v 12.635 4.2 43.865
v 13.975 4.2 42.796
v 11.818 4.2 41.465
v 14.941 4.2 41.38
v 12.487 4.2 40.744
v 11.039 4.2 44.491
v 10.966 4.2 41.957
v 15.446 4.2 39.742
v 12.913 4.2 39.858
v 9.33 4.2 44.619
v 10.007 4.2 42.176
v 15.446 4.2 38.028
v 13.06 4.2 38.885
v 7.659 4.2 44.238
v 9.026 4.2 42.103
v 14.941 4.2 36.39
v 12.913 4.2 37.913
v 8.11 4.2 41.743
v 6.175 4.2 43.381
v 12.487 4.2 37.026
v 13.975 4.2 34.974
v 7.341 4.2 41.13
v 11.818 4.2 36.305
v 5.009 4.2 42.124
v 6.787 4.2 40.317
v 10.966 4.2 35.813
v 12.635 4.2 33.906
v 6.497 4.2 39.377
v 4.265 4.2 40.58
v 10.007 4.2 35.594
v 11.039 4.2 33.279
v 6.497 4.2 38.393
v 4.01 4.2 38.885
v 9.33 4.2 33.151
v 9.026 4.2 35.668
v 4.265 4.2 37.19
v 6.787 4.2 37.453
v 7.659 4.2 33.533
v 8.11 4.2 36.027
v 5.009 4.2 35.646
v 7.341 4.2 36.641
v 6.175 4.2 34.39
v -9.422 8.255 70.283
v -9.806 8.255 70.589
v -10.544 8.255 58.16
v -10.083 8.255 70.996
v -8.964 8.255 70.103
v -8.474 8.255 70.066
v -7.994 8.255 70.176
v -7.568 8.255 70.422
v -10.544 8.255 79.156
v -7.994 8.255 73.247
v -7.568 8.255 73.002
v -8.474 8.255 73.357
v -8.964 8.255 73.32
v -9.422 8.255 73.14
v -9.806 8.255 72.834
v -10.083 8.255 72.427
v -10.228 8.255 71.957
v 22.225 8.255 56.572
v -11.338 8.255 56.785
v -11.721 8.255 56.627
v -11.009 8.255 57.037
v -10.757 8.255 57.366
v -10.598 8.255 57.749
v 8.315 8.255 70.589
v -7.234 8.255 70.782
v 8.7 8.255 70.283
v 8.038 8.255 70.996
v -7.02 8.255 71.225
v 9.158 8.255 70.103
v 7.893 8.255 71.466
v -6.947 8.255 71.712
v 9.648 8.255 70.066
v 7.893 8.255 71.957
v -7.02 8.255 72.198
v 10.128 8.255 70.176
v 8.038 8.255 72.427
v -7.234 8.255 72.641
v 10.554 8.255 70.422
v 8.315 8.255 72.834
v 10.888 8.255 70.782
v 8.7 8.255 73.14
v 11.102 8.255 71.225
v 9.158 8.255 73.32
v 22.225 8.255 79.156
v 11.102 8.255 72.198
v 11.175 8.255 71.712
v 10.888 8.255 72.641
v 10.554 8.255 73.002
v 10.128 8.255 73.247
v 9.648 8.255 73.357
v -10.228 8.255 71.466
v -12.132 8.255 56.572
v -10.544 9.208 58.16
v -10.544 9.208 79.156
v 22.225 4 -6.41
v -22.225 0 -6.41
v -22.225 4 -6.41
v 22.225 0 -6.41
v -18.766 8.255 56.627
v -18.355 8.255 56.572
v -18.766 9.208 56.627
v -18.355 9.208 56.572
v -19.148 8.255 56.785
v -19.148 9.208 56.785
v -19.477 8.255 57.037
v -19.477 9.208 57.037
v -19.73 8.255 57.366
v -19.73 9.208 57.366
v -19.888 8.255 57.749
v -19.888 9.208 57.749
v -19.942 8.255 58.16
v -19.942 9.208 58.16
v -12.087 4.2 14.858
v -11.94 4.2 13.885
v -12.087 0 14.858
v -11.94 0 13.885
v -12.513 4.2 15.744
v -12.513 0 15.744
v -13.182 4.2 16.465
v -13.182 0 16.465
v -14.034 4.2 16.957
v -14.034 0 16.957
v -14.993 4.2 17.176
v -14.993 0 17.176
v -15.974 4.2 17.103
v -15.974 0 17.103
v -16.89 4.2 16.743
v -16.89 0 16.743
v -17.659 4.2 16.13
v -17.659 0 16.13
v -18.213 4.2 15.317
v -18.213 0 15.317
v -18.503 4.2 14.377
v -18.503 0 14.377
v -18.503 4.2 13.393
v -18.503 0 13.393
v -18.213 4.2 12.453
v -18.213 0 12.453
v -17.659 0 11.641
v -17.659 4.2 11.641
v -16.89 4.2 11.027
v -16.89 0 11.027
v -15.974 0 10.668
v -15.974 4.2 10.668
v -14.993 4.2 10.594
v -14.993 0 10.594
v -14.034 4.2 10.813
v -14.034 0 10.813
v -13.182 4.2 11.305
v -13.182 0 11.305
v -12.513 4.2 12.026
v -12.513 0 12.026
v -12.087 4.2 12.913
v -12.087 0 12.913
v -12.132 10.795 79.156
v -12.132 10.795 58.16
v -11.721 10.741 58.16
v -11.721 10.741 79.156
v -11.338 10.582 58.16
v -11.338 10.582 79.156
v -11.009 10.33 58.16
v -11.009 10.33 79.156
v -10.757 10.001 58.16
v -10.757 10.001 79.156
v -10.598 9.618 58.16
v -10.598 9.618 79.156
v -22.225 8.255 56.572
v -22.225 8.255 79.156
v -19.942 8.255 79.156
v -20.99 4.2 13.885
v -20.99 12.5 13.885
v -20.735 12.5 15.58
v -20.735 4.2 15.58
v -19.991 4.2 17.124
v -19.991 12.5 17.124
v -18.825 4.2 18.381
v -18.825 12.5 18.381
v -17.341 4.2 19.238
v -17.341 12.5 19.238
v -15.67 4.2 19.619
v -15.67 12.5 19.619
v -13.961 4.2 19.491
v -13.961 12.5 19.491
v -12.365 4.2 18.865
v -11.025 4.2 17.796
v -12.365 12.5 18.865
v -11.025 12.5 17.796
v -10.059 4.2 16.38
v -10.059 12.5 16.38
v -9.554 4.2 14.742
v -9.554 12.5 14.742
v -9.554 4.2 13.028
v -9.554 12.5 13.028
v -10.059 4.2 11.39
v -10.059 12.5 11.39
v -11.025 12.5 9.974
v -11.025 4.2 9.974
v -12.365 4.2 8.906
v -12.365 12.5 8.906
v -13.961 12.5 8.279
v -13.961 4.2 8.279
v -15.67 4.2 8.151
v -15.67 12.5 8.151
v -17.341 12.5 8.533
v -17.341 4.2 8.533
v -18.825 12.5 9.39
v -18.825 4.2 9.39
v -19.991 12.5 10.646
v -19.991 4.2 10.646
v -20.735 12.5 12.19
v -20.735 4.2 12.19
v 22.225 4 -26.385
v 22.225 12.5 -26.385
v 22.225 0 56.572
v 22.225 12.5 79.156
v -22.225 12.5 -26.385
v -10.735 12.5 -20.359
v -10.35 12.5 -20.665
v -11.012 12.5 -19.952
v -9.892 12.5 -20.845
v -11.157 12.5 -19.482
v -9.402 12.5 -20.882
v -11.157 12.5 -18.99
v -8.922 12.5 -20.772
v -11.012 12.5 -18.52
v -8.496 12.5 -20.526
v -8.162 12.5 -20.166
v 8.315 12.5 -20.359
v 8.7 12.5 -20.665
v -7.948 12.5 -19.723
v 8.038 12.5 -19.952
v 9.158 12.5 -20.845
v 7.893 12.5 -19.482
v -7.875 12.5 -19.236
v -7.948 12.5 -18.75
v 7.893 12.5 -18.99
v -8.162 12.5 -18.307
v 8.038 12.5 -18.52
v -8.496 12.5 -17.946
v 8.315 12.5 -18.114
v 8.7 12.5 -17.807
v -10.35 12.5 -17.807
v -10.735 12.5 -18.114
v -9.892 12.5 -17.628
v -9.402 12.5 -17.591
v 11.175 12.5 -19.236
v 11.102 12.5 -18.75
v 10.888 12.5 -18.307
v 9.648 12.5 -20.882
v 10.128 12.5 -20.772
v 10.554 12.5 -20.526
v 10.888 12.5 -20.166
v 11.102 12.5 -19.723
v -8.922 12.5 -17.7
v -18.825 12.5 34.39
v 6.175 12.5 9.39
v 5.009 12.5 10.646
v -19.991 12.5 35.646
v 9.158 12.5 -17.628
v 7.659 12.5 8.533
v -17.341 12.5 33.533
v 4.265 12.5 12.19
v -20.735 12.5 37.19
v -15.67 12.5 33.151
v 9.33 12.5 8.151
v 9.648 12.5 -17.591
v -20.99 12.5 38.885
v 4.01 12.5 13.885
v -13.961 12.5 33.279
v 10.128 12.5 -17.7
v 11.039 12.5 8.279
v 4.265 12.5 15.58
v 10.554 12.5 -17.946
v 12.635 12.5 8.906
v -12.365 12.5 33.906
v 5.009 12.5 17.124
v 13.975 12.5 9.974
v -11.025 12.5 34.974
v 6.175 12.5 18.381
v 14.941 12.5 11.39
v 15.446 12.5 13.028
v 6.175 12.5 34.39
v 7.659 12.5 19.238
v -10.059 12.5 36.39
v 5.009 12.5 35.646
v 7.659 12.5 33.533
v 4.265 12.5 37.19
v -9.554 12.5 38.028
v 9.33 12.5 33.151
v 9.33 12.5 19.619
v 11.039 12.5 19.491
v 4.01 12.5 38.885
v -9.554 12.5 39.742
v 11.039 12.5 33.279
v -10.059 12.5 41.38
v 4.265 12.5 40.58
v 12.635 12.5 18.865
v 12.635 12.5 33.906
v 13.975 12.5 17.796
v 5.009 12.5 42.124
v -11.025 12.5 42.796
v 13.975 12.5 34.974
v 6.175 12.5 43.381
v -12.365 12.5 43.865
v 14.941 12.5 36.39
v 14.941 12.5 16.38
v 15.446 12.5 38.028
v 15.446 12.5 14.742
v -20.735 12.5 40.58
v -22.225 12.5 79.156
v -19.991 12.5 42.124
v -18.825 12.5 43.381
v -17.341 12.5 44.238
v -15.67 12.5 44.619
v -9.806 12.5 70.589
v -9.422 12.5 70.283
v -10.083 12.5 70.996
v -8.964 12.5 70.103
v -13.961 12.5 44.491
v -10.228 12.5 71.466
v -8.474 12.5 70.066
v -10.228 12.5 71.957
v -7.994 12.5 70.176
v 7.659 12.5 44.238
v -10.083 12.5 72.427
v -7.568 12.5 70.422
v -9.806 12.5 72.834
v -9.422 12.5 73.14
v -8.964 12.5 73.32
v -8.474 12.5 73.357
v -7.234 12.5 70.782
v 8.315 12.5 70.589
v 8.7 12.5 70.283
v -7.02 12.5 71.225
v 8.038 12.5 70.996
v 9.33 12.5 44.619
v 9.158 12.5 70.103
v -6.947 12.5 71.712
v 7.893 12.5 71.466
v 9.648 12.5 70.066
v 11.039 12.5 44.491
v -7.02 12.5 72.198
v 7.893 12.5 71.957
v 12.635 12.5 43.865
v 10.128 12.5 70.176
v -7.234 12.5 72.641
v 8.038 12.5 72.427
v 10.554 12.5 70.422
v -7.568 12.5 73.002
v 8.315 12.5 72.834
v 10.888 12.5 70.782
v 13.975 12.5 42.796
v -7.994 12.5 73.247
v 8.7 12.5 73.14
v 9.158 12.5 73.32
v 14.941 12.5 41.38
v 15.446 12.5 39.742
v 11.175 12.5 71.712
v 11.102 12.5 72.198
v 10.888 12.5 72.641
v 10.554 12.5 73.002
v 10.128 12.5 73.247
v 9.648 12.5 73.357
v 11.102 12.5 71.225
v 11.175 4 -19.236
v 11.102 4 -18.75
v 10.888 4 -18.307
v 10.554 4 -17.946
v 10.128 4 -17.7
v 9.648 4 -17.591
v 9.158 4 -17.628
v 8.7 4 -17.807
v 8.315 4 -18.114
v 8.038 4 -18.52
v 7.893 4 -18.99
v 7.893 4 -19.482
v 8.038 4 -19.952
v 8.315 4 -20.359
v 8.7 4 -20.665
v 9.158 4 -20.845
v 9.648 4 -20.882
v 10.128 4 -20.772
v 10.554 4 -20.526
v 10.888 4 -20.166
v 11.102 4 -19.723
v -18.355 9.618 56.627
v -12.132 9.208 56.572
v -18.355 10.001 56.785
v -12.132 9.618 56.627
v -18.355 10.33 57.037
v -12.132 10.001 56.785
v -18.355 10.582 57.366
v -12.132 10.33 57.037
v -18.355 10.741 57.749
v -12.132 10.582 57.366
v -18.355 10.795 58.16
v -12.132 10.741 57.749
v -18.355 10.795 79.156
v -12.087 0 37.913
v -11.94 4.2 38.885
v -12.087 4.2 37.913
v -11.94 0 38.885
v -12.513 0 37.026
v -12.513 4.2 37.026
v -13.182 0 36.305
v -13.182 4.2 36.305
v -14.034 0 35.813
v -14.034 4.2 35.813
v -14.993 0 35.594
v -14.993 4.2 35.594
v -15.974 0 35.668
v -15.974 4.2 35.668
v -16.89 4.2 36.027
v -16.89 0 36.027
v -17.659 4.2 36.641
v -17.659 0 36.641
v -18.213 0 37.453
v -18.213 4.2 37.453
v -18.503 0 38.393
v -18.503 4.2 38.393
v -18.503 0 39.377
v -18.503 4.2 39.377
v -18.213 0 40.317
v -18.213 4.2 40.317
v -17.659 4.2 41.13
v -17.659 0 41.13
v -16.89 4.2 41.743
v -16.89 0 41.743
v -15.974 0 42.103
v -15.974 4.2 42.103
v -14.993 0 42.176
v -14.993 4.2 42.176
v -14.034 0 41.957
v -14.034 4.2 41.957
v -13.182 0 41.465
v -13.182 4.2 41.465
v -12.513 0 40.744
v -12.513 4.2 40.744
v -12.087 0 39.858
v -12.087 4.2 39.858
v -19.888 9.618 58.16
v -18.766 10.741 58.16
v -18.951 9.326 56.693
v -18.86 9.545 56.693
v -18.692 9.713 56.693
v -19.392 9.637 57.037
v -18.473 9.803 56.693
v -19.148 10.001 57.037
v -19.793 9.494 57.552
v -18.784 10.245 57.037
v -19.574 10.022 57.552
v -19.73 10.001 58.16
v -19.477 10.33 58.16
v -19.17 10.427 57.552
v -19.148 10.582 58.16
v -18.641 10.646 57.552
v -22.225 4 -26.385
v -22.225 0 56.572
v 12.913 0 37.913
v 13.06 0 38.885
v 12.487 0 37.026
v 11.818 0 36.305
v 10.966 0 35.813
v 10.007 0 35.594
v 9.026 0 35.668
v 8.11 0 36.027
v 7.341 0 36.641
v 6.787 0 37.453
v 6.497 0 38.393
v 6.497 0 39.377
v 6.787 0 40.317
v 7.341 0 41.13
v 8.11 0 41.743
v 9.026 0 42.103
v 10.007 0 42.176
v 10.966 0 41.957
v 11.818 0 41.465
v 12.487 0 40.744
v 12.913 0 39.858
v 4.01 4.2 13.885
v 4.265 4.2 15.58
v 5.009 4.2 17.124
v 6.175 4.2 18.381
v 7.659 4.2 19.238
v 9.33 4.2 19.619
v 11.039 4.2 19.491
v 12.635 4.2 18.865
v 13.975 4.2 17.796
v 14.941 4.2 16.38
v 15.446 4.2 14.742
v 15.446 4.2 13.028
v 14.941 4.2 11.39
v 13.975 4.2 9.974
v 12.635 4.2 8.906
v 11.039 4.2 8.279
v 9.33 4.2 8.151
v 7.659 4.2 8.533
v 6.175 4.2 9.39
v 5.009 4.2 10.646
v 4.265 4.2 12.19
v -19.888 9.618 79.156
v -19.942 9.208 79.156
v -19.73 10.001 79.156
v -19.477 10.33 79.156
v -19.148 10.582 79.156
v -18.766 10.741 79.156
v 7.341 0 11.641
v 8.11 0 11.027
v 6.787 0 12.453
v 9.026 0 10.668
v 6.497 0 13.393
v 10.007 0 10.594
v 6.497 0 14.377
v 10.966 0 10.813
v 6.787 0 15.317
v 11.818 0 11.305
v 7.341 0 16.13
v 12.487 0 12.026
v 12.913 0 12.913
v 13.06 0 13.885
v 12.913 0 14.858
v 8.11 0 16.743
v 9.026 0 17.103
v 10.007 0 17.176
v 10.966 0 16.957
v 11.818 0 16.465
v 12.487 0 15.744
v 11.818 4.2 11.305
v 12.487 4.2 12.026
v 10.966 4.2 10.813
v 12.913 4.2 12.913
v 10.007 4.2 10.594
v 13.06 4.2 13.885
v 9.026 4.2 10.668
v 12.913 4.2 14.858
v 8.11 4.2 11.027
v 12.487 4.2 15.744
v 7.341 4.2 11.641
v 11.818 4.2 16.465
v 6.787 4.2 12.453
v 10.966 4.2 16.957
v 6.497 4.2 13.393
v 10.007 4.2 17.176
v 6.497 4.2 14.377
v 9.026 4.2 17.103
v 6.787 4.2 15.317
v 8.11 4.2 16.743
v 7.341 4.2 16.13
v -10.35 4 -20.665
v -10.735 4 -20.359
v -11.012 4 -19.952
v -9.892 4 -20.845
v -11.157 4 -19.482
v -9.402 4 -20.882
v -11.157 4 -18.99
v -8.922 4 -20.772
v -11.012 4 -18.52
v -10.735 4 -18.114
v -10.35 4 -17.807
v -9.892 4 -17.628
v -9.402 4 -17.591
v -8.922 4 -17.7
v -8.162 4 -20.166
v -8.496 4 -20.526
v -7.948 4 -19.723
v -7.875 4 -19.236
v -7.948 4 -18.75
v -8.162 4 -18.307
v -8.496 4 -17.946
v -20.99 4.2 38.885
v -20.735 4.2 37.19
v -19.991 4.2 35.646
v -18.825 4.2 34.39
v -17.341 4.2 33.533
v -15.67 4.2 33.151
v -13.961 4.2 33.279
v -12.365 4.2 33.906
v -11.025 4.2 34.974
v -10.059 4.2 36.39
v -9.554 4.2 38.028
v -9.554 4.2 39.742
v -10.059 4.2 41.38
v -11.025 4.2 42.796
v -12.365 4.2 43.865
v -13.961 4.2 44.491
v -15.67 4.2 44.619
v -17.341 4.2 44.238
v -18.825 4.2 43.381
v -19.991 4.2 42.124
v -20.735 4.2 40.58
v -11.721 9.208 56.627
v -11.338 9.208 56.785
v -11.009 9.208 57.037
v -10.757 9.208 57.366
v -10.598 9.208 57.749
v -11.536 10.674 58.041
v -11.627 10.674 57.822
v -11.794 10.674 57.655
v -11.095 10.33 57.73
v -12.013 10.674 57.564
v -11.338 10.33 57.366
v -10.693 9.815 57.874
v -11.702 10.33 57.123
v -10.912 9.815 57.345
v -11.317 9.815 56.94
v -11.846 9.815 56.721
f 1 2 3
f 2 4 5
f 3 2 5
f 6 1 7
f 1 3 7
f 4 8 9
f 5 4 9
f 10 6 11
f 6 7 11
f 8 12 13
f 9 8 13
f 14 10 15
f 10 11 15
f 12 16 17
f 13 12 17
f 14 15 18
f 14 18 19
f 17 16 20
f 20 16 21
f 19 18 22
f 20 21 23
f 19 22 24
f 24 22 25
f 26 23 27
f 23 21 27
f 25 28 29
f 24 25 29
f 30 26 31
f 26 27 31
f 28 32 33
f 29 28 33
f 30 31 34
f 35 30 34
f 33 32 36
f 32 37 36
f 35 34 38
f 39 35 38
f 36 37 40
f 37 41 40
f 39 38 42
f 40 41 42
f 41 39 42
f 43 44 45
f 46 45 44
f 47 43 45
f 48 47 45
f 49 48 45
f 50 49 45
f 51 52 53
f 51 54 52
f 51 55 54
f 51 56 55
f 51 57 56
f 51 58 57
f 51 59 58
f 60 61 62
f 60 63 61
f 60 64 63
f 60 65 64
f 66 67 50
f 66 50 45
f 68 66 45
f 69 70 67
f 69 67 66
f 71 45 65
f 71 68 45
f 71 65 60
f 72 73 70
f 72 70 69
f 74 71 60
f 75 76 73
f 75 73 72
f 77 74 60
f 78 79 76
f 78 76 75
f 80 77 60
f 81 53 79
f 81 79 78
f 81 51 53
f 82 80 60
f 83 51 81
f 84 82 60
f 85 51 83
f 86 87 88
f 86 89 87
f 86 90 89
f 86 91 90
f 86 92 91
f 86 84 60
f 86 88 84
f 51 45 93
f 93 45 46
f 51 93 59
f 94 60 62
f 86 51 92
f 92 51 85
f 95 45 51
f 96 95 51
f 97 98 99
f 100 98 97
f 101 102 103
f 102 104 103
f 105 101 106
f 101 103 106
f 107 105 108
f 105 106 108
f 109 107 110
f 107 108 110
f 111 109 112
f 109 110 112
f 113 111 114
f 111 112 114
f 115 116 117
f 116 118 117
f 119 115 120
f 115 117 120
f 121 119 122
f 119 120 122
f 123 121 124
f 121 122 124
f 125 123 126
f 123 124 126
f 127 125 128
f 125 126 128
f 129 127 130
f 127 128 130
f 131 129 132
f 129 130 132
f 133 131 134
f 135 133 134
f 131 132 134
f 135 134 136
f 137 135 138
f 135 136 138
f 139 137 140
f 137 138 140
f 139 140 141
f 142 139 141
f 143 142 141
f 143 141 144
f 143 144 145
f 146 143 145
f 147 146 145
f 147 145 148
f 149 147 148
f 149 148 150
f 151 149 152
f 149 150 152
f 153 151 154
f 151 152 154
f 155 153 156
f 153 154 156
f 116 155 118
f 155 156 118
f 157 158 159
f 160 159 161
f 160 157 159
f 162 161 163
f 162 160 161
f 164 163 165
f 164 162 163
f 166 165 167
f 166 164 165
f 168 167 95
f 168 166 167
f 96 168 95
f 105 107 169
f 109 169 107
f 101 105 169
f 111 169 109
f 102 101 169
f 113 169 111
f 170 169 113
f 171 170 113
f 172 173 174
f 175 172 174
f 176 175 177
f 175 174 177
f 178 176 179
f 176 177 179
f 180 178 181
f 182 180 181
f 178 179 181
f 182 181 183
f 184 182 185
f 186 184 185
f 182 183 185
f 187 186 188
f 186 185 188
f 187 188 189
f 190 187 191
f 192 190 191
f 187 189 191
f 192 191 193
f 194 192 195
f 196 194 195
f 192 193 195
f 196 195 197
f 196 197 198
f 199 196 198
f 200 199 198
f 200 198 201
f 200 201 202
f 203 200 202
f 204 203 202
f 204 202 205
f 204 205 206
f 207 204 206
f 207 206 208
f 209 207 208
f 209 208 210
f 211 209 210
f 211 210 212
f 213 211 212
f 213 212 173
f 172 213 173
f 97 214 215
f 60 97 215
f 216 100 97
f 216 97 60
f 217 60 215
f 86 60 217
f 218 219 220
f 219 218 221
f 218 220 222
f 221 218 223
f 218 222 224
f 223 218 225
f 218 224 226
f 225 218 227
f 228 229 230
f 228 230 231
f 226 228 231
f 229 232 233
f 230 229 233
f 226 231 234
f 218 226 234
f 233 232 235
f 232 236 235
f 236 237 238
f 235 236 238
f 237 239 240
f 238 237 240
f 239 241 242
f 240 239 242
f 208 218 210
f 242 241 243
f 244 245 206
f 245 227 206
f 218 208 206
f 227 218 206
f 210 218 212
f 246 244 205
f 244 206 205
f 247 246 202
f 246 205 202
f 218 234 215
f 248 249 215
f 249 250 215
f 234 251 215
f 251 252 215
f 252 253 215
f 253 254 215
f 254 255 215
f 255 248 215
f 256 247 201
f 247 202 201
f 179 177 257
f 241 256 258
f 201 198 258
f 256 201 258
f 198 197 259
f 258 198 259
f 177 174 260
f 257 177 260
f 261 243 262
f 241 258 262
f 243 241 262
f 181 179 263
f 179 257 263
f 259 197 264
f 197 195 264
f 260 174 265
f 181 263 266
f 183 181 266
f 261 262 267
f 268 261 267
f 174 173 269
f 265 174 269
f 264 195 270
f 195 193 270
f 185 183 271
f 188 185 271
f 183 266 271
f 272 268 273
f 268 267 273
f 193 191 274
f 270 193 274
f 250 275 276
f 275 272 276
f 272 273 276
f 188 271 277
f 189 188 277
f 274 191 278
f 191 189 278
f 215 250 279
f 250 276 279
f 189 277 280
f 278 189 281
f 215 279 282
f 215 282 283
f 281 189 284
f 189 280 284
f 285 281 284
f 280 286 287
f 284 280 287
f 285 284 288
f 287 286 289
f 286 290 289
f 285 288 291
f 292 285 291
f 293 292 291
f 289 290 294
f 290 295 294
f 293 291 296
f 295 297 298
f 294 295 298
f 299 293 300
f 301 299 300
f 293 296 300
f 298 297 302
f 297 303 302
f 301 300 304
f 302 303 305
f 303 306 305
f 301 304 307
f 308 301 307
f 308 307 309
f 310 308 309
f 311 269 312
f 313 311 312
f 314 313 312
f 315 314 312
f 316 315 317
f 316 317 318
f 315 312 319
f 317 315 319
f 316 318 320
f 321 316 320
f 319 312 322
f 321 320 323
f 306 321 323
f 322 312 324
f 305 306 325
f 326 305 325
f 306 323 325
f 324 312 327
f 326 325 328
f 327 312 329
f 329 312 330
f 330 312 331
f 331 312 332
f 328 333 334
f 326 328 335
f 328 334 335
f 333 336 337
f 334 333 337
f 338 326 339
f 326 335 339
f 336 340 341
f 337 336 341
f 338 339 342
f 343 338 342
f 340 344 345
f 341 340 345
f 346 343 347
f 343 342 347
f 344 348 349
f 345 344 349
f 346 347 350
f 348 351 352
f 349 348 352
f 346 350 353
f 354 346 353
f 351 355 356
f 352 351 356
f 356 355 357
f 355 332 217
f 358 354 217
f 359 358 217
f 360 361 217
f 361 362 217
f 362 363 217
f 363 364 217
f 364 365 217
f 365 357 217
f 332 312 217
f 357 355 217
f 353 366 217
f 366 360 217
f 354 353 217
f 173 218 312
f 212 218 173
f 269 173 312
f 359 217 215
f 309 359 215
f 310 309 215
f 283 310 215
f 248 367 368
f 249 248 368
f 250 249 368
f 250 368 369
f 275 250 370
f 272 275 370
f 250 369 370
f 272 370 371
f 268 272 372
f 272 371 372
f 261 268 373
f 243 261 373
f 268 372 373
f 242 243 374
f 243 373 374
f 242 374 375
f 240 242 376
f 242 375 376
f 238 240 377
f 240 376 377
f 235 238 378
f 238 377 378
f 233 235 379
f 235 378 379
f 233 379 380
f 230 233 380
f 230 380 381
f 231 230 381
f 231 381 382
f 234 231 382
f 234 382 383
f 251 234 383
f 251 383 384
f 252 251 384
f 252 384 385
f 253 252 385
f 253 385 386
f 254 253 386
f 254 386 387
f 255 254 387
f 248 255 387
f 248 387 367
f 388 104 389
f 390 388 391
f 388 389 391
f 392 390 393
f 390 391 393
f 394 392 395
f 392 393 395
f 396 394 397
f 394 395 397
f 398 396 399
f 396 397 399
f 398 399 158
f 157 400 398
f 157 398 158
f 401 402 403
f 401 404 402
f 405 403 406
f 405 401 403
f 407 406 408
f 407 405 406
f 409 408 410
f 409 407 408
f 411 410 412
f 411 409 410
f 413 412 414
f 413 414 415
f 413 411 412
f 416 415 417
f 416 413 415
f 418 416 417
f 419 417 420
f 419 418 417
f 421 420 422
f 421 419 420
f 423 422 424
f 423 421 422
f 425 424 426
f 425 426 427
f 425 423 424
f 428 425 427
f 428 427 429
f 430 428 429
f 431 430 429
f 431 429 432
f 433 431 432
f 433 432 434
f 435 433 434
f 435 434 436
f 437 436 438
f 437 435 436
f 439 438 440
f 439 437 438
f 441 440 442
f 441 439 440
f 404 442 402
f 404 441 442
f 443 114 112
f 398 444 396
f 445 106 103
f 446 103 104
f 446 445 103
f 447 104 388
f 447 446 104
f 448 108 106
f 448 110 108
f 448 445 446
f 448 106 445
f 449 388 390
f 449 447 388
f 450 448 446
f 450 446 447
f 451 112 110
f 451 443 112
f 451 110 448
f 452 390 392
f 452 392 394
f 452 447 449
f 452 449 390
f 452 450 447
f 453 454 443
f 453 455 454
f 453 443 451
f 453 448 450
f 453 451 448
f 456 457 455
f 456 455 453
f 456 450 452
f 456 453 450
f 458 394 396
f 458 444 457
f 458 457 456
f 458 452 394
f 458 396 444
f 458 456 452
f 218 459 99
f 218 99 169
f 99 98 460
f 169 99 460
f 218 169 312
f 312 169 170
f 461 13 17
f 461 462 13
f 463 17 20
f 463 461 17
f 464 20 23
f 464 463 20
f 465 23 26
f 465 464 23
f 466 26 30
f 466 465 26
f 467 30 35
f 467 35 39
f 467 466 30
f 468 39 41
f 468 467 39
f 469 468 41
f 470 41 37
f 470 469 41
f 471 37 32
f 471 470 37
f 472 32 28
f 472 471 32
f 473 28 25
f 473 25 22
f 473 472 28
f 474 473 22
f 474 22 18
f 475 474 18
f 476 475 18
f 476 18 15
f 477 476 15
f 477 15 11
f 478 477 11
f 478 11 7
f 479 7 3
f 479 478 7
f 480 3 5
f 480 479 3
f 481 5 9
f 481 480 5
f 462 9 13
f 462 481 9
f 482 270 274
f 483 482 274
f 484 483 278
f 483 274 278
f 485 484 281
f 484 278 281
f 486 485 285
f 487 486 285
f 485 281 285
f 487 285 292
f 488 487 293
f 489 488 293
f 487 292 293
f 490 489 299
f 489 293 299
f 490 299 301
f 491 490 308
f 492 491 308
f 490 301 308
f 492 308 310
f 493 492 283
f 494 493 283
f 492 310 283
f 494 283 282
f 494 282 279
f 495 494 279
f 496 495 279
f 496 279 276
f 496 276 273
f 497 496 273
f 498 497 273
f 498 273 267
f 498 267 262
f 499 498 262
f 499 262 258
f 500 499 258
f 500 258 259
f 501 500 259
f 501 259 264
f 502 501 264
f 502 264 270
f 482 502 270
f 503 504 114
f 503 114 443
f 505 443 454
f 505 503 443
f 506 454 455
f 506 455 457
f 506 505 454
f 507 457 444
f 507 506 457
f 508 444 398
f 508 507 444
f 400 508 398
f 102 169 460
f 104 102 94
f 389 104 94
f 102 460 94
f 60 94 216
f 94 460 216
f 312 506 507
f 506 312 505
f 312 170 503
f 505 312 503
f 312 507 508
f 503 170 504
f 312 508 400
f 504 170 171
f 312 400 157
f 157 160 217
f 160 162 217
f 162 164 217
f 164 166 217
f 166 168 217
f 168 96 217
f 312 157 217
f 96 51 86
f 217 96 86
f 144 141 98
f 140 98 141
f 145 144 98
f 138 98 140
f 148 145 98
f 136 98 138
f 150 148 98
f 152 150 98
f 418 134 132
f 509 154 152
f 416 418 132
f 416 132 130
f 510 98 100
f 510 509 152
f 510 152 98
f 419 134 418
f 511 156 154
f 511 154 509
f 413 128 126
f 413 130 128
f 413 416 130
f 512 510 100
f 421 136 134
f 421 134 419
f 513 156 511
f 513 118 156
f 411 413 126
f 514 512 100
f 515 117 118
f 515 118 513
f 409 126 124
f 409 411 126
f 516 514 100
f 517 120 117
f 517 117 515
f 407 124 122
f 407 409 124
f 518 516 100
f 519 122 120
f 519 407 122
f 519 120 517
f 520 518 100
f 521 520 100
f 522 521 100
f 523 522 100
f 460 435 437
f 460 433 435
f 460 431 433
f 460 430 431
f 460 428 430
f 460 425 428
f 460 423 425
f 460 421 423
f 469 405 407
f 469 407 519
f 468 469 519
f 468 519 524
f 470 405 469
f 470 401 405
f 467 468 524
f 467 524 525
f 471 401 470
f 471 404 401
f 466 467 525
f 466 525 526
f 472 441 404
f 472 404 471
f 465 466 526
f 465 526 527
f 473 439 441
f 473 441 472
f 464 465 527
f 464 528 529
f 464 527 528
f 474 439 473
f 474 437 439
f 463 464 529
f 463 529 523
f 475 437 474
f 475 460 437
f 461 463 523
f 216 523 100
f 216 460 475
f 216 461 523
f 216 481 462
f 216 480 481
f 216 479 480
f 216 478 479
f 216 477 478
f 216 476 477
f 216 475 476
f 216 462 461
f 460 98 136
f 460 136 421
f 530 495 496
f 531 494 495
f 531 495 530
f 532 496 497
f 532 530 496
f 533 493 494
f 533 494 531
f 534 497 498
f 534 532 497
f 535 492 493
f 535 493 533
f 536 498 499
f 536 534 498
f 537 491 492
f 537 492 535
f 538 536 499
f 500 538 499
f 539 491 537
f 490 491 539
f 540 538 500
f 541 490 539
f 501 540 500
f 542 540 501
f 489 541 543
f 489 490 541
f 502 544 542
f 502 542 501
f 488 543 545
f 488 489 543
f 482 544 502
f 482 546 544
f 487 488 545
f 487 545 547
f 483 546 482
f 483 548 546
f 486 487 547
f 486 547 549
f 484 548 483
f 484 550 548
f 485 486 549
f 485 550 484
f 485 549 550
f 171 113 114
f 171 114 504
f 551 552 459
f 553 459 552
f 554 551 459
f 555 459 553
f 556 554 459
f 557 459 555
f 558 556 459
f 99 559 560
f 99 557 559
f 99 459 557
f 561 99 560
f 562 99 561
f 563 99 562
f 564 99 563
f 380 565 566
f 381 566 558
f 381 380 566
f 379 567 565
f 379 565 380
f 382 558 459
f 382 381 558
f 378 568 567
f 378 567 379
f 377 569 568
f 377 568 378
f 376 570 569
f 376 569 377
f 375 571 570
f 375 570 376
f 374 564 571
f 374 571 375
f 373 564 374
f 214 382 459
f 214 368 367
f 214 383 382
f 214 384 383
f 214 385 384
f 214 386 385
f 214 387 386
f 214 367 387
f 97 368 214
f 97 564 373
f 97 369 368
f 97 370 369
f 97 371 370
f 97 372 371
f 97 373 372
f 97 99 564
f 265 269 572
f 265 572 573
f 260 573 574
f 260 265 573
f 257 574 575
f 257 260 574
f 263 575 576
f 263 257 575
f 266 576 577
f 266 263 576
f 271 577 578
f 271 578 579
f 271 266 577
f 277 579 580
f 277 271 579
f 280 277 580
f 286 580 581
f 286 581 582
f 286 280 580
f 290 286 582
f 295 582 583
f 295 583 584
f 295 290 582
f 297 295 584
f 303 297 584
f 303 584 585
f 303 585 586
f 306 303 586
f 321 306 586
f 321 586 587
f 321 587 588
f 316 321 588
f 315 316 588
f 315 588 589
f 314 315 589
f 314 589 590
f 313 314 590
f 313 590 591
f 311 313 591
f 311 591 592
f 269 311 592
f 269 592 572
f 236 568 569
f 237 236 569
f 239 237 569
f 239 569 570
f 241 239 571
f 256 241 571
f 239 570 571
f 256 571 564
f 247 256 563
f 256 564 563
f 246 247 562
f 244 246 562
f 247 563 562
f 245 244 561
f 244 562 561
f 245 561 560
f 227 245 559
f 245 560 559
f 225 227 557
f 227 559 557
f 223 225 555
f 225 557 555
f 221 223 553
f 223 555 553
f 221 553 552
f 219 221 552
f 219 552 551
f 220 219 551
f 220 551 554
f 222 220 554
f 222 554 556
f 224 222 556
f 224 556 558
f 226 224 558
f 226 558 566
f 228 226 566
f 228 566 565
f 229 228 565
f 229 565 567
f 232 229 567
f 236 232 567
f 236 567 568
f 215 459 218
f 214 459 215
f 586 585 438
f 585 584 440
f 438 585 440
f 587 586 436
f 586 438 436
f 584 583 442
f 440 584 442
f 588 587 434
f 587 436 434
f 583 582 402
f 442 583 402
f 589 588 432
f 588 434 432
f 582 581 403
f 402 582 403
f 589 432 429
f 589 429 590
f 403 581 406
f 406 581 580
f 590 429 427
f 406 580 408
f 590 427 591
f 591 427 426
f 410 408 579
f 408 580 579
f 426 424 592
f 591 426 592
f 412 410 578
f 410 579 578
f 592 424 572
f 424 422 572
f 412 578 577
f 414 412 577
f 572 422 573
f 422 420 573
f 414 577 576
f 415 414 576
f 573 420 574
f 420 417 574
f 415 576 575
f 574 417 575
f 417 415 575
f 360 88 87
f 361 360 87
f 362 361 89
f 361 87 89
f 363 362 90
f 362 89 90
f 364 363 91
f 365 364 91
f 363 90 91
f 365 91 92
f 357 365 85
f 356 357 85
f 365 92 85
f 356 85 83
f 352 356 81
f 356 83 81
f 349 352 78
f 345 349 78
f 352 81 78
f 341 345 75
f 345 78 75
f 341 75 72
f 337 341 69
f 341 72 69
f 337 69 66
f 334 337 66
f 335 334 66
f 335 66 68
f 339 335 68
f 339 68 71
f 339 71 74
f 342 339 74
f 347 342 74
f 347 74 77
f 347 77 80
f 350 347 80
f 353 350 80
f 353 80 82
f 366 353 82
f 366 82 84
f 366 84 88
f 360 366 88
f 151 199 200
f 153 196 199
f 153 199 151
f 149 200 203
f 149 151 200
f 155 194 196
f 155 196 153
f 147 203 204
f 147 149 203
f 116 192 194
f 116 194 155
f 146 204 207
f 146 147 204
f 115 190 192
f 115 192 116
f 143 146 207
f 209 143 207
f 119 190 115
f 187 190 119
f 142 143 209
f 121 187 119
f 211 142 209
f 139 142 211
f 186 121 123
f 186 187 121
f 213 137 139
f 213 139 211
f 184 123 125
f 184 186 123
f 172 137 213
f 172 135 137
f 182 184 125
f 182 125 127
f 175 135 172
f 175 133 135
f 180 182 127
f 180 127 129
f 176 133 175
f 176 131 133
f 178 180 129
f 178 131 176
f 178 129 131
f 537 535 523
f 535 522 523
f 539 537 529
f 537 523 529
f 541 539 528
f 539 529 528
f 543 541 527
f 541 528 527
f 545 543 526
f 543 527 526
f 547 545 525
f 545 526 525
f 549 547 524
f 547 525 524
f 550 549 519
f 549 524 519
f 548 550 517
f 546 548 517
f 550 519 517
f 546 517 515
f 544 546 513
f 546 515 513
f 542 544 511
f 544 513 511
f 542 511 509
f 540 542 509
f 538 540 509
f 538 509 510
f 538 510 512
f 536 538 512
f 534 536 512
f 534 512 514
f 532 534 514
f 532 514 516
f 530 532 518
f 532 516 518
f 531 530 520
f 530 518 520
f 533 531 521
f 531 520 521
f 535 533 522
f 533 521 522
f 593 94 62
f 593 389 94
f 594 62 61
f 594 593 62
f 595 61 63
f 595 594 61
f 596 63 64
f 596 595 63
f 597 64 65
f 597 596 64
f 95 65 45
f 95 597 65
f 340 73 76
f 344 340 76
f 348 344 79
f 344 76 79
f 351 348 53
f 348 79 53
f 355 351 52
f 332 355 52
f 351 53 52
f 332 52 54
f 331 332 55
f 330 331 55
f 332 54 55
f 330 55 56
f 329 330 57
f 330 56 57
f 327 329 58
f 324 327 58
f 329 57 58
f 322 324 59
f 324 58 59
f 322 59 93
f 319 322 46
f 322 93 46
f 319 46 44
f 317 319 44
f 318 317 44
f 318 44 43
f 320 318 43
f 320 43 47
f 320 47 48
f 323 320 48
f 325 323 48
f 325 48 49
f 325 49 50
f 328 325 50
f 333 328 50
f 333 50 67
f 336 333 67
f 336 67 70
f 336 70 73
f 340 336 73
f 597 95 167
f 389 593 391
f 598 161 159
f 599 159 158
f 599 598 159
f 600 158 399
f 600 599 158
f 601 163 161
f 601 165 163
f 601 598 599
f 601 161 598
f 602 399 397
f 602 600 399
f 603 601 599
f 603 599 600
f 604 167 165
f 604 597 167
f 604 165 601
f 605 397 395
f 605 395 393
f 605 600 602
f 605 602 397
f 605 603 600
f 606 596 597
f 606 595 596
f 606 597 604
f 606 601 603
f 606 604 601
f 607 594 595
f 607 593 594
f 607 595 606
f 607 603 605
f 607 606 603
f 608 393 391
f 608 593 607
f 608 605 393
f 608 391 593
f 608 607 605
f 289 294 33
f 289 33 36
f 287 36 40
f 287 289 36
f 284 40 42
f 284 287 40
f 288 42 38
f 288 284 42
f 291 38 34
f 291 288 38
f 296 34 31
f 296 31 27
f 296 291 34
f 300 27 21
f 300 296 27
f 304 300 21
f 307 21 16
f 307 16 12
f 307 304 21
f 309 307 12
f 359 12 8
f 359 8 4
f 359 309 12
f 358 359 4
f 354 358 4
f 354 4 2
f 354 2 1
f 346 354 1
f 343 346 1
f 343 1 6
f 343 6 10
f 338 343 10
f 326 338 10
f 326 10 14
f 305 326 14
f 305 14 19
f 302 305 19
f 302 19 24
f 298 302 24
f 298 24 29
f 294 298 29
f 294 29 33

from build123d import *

# Parameters (mm, degrees)
SKETCH1_W                       = 44.45
SKETCH1_H                       = 52.7704812
EXTRUDE1_DEPTH                  = 12.5
M4X0_7_TAPPED_HOLE2_D           = 3.3
CBORE_FOR_M6_SBHCS1_D           = 6.6
CBORE_FOR_M6_SBHCS1_CBORE_D     = 11.5
CBORE_FOR_M6_SBHCS1_CBORE_DEPTH = 8.3
SKETCH6_W                       = 44.45
SKETCH6_H                       = 22.583276864
EXTRUDE2_DEPTH                  = 8.255
SKETCH7_W                       = 44.45
SKETCH7_H                       = 19.975275
EXTRUDE3_DEPTH                  = 4
SKETCH8_W                       = 9.398
SKETCH8_H                       = 22.583276864
CUT_EXTRUDE1_DEPTH              = 2.54
FILLET1_R                       = 1.5875
M4X0_7_TAPPED_HOLE3_D           = 3.3


with BuildPart() as part:
    # Sketch1 → Extrude1 (new body)
    with BuildSketch(Plane(origin=(0, 0, 0), x_dir=(1, 0, 0), z_dir=(0, 1, 0))):
        Rectangle(SKETCH1_W, SKETCH1_H)
    extrude1 = extrude(amount=EXTRUDE1_DEPTH)

    # M4x0.7 Tapped Hole2 (through all)
    with Locations(Plane(origin=(0, 12.5, 0), x_dir=(-1, 0, 0), z_dir=(0, 1, 0))):
        with Locations((9.525000018, -19.236265325), (-9.525000018, -19.236265325)):
            Hole(M4X0_7_TAPPED_HOLE2_D / 2)

    # CBORE for M6 SBHCS1 (through all)
    with Locations(Plane(origin=(0, 12.5, 0), x_dir=(-1, 0, 0), z_dir=(0, 1, 0))):
        with Locations((15.24, 13.8852406), (-9.76, 13.8852406)):
            cbore_for_m6_sbhcs1 = CounterBoreHole(CBORE_FOR_M6_SBHCS1_D / 2, CBORE_FOR_M6_SBHCS1_CBORE_D / 2, CBORE_FOR_M6_SBHCS1_CBORE_DEPTH)

    # Mirror1: Extrude1, CBORE for M6 SBHCS1 across plane
    add(extrude1.mirror(Plane(origin=(-22.225, 12.5, 26.3852406), x_dir=(1, 0, 0), z_dir=(0, 0, -1))))
    add(cbore_for_m6_sbhcs1.mirror(Plane(origin=(-22.225, 12.5, 26.3852406), x_dir=(1, 0, 0), z_dir=(0, 0, -1))), mode=Mode.SUBTRACT)

    # Sketch6 → Extrude2 (cut)
    with BuildSketch(Plane.XZ):
        with Locations((0, 67.864083368)):
            Rectangle(SKETCH6_W, SKETCH6_H)
    extrude(amount=-EXTRUDE2_DEPTH, mode=Mode.SUBTRACT)

    # Sketch7 → Extrude3 (cut)
    with BuildSketch(Plane.XZ):
        with Locations((0, -16.3976031)):
            Rectangle(SKETCH7_W, SKETCH7_H)
    extrude(amount=-EXTRUDE3_DEPTH, mode=Mode.SUBTRACT)

    # Sketch8 → Cut-Extrude1 (cut)
    with BuildSketch(Plane.XZ.offset(-8.255)):
        with Locations((-15.2432004, 67.864083368)):
            Rectangle(SKETCH8_W, SKETCH8_H)
    extrude(amount=-CUT_EXTRUDE1_DEPTH, mode=Mode.SUBTRACT)

    # Fillet1
    fillet1_edges = [part.edges().sort_by_distance(p)[0] for p in [
        (-10.5442004, 9.525, 56.572444936),
        (-19.9422004, 10.795, 67.864083368),
        (-19.9422004, 9.525, 56.572444936),
        (-10.5442004, 10.795, 67.864083368),
        (-15.2432004, 10.795, 56.572444936),
    ]]
    fillet(fillet1_edges, radius=FILLET1_R)

    # M4x0.7 Tapped Hole3 (through all)
    with Locations(Plane(origin=(0, 12.5, 0), x_dir=(-1, 0, 0), z_dir=(0, 1, 0))):
        with Locations((-9.524999982, 71.7115406), (8.596896608, 71.7115406)):
            Hole(M4X0_7_TAPPED_HOLE3_D / 2)


solid = part.part
